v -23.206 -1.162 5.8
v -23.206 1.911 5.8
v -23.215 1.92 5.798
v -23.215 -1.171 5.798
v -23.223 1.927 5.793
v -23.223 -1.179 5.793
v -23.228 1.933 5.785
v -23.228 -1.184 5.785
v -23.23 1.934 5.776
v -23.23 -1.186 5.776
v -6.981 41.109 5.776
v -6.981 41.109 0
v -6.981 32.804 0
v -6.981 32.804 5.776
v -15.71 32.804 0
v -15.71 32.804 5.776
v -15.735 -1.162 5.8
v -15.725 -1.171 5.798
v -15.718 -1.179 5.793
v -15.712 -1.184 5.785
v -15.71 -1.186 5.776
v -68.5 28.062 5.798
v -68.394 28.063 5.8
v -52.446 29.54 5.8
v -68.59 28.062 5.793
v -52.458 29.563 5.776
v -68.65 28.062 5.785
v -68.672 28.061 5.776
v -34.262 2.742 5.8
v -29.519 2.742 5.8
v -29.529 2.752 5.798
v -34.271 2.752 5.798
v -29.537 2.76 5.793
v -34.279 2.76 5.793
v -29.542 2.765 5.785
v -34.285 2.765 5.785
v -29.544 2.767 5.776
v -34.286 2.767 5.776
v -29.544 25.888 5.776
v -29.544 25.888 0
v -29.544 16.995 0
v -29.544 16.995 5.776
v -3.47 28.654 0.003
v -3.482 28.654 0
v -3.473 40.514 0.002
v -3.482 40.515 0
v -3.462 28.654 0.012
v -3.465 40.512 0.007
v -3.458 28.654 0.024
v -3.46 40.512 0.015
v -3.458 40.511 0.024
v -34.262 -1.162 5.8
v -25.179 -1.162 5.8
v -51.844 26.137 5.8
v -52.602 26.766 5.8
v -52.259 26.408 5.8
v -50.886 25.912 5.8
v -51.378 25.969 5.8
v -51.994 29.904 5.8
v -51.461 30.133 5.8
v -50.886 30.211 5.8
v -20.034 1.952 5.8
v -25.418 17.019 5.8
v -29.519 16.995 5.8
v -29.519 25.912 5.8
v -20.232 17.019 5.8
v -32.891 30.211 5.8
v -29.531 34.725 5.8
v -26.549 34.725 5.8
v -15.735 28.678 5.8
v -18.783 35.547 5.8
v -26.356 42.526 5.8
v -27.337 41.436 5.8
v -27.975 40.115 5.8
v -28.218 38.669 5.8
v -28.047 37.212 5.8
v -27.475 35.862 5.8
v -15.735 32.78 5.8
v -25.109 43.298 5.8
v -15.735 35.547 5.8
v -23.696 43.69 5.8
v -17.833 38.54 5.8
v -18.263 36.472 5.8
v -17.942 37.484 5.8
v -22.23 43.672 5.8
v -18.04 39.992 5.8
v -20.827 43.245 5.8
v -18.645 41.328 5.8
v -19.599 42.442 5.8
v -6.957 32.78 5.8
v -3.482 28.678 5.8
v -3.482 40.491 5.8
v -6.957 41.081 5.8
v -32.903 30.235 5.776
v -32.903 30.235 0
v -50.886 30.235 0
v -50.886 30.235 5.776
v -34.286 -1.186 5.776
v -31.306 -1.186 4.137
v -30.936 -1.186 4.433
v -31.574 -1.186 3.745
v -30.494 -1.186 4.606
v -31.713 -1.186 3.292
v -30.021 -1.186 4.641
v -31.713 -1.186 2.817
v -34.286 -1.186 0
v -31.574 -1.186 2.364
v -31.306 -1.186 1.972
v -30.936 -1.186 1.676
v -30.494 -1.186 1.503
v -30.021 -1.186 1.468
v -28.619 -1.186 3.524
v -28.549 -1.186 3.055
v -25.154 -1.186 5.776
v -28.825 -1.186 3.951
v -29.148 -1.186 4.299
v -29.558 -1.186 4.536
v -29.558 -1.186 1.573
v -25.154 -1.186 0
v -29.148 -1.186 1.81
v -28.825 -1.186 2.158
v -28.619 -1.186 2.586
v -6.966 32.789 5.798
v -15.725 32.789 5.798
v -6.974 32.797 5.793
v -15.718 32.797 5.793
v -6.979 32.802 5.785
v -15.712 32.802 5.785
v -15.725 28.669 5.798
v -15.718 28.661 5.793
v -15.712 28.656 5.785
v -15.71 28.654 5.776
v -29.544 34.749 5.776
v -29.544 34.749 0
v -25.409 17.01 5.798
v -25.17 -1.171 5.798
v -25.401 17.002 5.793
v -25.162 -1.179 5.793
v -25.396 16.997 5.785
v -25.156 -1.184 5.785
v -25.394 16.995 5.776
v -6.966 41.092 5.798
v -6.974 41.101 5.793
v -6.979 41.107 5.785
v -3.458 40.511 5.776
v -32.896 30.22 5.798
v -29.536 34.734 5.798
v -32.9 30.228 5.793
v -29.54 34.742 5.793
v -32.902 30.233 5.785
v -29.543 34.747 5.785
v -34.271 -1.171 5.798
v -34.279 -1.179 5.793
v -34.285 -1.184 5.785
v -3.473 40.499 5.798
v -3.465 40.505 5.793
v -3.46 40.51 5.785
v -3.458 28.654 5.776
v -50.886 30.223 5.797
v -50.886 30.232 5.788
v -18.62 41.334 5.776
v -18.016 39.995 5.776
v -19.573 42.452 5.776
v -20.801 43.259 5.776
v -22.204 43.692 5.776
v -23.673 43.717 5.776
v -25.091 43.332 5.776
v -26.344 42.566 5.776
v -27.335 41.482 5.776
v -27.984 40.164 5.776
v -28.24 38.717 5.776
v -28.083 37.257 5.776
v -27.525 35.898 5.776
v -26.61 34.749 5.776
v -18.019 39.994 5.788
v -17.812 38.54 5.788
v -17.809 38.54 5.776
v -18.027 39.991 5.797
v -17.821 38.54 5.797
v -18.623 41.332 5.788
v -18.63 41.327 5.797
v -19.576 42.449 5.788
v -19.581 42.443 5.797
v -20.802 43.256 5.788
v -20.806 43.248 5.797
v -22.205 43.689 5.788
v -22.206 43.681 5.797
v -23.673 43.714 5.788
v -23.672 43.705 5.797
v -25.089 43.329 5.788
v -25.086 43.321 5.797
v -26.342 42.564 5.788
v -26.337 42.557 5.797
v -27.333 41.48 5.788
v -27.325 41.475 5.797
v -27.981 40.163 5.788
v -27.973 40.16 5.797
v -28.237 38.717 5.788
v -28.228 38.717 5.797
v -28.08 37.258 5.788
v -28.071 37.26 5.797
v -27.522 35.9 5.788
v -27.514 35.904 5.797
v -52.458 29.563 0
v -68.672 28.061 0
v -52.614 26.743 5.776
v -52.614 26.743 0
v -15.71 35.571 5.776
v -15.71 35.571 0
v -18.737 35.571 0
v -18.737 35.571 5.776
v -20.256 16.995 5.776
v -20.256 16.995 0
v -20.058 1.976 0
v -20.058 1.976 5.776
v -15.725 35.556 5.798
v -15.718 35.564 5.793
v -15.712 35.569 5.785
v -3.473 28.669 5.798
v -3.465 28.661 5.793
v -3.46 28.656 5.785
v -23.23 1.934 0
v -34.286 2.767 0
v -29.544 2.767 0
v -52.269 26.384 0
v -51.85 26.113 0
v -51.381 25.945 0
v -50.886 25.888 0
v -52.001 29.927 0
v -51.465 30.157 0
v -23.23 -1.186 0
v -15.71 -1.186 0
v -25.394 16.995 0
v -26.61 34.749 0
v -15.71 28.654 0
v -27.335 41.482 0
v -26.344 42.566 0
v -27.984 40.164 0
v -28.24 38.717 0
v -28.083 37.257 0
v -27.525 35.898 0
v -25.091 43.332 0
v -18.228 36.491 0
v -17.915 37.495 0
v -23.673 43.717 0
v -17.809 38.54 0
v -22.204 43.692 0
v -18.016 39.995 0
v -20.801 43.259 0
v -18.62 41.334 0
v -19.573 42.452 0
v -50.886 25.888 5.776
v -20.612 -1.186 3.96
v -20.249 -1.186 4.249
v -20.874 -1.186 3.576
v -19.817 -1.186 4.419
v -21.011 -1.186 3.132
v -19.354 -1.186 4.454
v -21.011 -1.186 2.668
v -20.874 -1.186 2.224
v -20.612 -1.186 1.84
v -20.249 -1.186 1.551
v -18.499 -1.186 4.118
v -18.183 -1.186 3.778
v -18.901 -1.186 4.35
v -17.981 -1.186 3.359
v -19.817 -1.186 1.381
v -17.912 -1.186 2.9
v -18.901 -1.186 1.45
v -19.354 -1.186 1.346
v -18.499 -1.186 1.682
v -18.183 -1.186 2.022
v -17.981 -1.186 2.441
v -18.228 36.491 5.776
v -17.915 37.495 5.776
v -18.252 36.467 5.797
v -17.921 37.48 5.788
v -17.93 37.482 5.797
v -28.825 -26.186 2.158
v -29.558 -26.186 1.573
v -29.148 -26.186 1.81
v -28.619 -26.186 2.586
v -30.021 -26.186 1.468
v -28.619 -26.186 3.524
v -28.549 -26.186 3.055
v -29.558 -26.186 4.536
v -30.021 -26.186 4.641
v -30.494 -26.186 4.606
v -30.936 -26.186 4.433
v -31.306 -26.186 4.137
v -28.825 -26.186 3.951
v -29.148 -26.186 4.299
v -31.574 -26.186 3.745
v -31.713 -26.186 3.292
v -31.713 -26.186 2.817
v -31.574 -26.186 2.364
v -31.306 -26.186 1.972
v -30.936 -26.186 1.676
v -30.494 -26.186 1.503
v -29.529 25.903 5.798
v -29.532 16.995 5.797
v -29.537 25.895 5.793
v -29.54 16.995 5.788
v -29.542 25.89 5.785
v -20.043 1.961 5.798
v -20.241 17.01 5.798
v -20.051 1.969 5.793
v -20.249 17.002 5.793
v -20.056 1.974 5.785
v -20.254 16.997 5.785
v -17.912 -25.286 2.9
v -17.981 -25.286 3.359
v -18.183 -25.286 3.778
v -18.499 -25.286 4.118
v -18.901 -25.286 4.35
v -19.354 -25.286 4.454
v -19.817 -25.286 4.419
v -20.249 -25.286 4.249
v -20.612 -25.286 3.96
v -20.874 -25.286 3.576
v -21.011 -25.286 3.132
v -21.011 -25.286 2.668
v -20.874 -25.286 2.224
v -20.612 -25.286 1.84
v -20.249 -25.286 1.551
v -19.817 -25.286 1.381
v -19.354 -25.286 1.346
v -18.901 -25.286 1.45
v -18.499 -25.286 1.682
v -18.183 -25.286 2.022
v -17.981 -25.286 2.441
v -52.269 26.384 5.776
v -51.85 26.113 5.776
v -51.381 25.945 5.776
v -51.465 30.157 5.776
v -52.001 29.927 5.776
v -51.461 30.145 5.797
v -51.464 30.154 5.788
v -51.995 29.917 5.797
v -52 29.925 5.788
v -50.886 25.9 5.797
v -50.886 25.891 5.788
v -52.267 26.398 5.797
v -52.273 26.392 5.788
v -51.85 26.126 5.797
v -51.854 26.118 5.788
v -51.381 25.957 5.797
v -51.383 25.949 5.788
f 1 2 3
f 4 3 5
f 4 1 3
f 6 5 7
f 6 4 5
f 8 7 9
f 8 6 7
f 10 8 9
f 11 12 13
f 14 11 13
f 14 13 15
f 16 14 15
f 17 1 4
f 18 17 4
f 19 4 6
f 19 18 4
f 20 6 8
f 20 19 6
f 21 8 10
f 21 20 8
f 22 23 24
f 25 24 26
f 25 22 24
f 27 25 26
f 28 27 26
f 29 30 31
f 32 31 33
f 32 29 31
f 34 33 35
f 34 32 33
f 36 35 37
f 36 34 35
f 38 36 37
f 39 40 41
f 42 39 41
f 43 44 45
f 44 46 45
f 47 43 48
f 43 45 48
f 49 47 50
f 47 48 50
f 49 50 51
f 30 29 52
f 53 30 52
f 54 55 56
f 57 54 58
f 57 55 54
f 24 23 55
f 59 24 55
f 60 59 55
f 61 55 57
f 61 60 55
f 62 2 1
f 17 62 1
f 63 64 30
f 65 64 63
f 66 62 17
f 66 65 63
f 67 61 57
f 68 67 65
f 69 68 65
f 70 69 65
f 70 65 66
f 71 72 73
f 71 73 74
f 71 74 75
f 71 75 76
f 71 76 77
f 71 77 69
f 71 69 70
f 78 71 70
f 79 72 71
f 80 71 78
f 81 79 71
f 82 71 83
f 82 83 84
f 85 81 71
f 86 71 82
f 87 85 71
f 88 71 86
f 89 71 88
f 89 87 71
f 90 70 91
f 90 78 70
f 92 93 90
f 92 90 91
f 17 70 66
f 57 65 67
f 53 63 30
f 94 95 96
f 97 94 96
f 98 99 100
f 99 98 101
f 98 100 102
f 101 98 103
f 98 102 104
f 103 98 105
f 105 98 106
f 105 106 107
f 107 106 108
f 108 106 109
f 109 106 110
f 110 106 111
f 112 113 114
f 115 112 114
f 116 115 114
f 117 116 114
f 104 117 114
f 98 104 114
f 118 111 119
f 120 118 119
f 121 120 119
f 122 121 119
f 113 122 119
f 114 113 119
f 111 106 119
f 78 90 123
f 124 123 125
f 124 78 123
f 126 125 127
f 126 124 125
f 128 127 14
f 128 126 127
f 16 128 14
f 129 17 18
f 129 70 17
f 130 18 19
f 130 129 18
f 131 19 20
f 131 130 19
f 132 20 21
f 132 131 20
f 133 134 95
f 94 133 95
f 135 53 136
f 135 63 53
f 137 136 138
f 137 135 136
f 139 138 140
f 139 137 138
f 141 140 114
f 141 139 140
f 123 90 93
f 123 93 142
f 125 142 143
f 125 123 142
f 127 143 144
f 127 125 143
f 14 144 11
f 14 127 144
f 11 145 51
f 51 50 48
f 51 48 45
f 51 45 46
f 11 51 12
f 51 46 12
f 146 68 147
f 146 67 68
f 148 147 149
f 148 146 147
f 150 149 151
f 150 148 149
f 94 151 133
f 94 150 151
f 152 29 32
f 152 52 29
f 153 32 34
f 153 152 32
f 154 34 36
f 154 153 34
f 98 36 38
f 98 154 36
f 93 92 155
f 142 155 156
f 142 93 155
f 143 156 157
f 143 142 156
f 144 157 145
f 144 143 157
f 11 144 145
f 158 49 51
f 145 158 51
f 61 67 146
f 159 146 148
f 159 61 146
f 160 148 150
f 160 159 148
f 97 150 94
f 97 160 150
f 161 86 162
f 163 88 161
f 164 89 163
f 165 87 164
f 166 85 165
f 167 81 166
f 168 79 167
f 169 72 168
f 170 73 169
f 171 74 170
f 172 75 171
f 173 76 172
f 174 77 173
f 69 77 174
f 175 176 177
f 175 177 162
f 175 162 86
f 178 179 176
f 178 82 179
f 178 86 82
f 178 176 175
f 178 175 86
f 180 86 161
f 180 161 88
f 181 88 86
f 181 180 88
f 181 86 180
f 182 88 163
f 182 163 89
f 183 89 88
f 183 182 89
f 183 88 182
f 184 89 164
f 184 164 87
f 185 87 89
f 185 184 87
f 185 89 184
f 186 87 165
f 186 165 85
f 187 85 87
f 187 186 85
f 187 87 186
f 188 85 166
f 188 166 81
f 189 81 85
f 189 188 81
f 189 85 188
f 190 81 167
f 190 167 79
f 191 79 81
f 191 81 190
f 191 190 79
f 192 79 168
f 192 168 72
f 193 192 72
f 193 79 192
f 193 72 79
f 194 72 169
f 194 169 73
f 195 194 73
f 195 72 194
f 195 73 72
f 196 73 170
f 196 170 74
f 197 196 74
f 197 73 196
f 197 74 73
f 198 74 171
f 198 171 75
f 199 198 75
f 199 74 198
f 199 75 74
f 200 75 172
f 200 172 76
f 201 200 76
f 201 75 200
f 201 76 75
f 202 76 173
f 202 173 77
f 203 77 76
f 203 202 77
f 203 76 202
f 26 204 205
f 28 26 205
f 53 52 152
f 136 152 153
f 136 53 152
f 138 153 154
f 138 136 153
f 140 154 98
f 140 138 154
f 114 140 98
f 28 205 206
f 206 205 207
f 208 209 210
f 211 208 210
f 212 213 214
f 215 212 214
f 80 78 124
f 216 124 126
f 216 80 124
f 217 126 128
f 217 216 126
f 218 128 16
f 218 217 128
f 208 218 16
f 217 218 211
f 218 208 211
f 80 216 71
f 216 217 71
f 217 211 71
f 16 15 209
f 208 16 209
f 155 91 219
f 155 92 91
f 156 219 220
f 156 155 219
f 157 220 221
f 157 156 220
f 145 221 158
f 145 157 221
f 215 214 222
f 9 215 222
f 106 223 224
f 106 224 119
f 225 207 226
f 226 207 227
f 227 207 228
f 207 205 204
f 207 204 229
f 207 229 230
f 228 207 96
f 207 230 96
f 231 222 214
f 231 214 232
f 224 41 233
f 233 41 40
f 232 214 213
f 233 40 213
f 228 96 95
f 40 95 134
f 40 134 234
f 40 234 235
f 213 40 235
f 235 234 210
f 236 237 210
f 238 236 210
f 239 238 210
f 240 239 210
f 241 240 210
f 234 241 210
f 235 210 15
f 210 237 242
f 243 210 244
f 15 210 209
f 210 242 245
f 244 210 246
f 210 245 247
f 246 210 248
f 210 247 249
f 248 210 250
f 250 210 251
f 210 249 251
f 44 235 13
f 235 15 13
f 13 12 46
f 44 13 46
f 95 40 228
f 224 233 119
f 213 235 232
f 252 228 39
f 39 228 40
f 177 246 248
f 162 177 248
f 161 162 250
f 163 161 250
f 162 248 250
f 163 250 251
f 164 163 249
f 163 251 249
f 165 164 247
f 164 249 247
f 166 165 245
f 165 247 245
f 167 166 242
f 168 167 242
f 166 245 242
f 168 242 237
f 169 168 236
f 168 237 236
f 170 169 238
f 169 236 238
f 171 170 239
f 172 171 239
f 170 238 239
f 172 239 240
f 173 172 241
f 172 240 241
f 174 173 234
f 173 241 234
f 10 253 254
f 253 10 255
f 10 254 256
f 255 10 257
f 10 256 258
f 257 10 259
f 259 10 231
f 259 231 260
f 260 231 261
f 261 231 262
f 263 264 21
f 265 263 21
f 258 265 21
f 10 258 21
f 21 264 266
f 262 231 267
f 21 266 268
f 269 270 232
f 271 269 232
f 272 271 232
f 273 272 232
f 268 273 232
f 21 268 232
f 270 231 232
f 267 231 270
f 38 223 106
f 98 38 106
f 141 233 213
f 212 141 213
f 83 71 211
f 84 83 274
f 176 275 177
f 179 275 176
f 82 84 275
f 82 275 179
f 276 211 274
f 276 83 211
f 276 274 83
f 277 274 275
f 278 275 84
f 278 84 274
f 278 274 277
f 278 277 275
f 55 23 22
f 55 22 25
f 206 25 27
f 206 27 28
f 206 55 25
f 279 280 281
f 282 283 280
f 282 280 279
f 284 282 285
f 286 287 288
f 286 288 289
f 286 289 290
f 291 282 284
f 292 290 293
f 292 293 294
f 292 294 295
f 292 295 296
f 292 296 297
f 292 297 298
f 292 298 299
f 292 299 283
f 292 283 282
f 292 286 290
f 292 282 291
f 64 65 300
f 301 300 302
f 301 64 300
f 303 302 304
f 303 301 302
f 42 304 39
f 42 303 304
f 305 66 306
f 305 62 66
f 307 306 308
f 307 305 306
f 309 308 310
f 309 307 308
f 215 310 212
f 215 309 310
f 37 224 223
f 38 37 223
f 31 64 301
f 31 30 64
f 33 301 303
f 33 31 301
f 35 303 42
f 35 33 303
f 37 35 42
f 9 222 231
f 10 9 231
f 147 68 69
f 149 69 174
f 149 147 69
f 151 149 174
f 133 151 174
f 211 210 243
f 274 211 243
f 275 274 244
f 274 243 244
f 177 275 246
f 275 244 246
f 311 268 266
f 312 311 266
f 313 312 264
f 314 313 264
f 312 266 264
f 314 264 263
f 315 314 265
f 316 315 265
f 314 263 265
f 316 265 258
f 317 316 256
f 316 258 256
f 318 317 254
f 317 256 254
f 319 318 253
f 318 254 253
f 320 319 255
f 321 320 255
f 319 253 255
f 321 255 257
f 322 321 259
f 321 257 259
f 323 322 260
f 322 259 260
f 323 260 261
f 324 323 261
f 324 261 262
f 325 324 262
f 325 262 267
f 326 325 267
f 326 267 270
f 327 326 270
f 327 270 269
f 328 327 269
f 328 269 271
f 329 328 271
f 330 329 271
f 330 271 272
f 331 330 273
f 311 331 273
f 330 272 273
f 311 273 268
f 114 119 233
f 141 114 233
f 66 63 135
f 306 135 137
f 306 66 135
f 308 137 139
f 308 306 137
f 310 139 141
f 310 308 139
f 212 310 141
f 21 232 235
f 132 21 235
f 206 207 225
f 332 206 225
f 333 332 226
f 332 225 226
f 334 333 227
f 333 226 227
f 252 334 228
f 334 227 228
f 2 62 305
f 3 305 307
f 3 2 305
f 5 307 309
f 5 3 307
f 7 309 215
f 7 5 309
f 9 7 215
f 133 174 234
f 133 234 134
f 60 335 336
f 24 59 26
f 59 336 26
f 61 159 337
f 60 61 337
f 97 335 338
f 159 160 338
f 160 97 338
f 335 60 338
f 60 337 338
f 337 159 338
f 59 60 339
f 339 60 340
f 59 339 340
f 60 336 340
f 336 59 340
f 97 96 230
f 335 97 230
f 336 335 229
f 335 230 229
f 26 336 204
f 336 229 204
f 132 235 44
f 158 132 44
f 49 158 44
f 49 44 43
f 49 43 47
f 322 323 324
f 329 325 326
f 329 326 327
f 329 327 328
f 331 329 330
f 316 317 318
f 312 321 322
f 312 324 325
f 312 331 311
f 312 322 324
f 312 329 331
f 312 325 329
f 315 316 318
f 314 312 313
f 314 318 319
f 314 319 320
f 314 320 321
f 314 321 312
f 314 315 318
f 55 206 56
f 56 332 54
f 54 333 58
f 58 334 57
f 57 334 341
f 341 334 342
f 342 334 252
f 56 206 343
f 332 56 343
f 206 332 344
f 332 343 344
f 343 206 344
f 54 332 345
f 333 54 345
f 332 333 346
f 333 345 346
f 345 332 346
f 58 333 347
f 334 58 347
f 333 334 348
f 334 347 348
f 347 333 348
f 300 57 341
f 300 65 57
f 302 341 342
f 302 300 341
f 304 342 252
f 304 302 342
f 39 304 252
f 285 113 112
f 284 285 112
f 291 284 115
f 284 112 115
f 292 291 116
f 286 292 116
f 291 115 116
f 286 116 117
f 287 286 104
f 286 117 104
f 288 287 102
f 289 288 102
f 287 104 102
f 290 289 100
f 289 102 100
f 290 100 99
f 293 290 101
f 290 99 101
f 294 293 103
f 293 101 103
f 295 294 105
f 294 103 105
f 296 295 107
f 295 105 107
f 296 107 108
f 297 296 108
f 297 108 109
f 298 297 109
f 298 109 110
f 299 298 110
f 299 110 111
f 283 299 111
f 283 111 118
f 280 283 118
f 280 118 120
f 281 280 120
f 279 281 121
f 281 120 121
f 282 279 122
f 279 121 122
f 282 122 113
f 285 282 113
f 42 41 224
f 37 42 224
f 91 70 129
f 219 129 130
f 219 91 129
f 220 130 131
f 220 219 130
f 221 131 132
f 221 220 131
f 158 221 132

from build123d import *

# Parameters (mm, degrees)
F1_DEPTH = 5.8
F2_R     = 1.591325
F3_DEPTH = 25
F4_R     = 1.558187
F5_DEPTH = 24.1
F6_R     = 0.024142


with BuildPart() as f1:
    # F0 (on Top) → F1 (new body)
    with BuildSketch(Plane.XY):
        with BuildLine():
            ThreePointArc((-18.736619, 35.570893), (-18.046336, 36.984925), (-17.809047, 38.540454))
            ThreePointArc((-17.809047, 38.540454), (-25.090576, 43.331899), (-26.609889, 34.748759))
            ThreePointArc((-26.609889, 34.748759), (-22.484422, 33.351452), (-18.736619, 35.570893))
        make_face()
        with BuildLine():
            ThreePointArc((-18.736619, 35.570893), (-22.484422, 33.351452), (-26.609889, 34.748759))
            Line((-26.609889, 34.748759), (-29.543604, 34.748759))
            Line((-29.543604, 34.748759), (-29.543604, 25.887705))
            Line((-29.543604, 25.887705), (-29.543604, 16.994981))
            Line((-29.543604, 16.994981), (-25.393665, 16.994981))
            Line((-25.393665, 16.994981), (-20.255648, 16.994981))
            Line((-20.255648, 16.994981), (-15.710477, 16.994981))
            Line((-15.710477, 16.994981), (-15.710477, 28.654329))
            Line((-15.710477, 28.654329), (-15.710477, 32.804266))
            Line((-15.710477, 32.804266), (-15.710477, 35.570893))
            Line((-15.710477, 35.570893), (-18.736619, 35.570893))
        make_face()
        Polygon((-29.543604, 25.887705), (-29.543604, 34.748759), (-32.903075, 30.235259), (-50.886139, 30.235259), (-50.886139, 25.887705), align=None)
        Polygon((-6.980983, 32.804266), (-15.710477, 32.804266), (-15.710477, 28.654329), (-3.458281, 28.654329), (-3.458281, 40.511291), (-6.980983, 41.109147), align=None)
        Polygon((-25.393665, 16.994981), (-29.543604, 16.994981), (-29.543603, 2.766625), (-34.286387, 2.766625), (-34.286387, -1.185696), (-25.154444, -1.185696), align=None)
        with BuildLine():
            ThreePointArc((-52.614244, 26.742787), (-51.850182, 26.113168), (-50.886139, 25.887705))
            Line((-50.886139, 25.887705), (-50.886139, 30.235259))
            ThreePointArc((-50.886139, 30.235259), (-51.740629, 30.06027), (-52.457546, 29.563477))
            ThreePointArc((-52.457546, 29.563477), (-53.056569, 28.182057), (-52.614244, 26.742787))
        make_face()
        with BuildLine():
            Line((-68.671584, 28.061482), (-52.614244, 26.742787))
            ThreePointArc((-52.614244, 26.742787), (-53.056569, 28.182057), (-52.457546, 29.563477))
            Line((-52.457546, 29.563477), (-68.671584, 28.061482))
        make_face()
        Polygon((-15.710477, -1.185696), (-15.710477, 16.994981), (-20.255648, 16.994981), (-20.05803, 1.976161), (-23.229739, 1.934428), (-23.229739, -1.185696), align=None)
    extrude(amount=F1_DEPTH)

    # F2 (on face) → F3 (join)
    with BuildSketch(Plane.XZ.offset(1.185696)):
        with Locations((-30.139845, 3.054563)):
            Circle(F2_R)
    extrude(amount=F3_DEPTH)

    # F4 (on face) → F5 (join)
    with BuildSketch(Plane.XZ.offset(1.185696)):
        with Locations((-19.470108, 2.9)):
            Circle(F4_R)
    extrude(amount=F5_DEPTH)

    # F6
    f6_edges = [f1.edges().sort_by_distance(p)[0] for p in [
        (-15.710477, 13.734317, 5.8),
        (-9.584379, 28.654329, 5.8),
        (-3.458281, 34.58281, 5.8),
        (-3.458281, 34.58281, 0),
        (-23.568103, 43.729456, 5.8),
        (-28.076746, 34.748759, 5.8),
        (-31.223339, 32.492009, 5.8),
        (-41.894607, 30.235259, 5.8),
        (-51.740629, 30.06027, 5.8),
        (-60.564565, 28.812479, 5.8),
        (-60.642914, 27.402134, 5.8),
        (-51.850182, 26.113168, 5.8),
        (-40.214871, 25.887705, 5.8),
        (-29.543604, 21.441343, 5.8),
        (-29.543603, 9.880803, 5.8),
        (-31.914995, 2.766625, 5.8),
        (-34.286387, 0.790464, 5.8),
        (-29.720416, -1.185696, 5.8),
        (-25.274054, 7.904642, 5.8),
        (-22.824656, 16.994981, 5.8),
        (-20.156839, 9.485571, 5.8),
        (-21.643885, 1.955294, 5.8),
        (-23.229739, 0.374366, 5.8),
        (-19.470108, -1.185696, 5.8),
        (-5.219632, 40.810219, 5.8),
        (-6.980983, 36.956706, 5.8),
        (-11.34573, 32.804266, 5.8),
        (-15.710477, 34.18758, 5.8),
        (-17.223548, 35.570893, 5.8),
    ]]
    fillet(f6_edges, radius=F6_R)


solid = f1.part
